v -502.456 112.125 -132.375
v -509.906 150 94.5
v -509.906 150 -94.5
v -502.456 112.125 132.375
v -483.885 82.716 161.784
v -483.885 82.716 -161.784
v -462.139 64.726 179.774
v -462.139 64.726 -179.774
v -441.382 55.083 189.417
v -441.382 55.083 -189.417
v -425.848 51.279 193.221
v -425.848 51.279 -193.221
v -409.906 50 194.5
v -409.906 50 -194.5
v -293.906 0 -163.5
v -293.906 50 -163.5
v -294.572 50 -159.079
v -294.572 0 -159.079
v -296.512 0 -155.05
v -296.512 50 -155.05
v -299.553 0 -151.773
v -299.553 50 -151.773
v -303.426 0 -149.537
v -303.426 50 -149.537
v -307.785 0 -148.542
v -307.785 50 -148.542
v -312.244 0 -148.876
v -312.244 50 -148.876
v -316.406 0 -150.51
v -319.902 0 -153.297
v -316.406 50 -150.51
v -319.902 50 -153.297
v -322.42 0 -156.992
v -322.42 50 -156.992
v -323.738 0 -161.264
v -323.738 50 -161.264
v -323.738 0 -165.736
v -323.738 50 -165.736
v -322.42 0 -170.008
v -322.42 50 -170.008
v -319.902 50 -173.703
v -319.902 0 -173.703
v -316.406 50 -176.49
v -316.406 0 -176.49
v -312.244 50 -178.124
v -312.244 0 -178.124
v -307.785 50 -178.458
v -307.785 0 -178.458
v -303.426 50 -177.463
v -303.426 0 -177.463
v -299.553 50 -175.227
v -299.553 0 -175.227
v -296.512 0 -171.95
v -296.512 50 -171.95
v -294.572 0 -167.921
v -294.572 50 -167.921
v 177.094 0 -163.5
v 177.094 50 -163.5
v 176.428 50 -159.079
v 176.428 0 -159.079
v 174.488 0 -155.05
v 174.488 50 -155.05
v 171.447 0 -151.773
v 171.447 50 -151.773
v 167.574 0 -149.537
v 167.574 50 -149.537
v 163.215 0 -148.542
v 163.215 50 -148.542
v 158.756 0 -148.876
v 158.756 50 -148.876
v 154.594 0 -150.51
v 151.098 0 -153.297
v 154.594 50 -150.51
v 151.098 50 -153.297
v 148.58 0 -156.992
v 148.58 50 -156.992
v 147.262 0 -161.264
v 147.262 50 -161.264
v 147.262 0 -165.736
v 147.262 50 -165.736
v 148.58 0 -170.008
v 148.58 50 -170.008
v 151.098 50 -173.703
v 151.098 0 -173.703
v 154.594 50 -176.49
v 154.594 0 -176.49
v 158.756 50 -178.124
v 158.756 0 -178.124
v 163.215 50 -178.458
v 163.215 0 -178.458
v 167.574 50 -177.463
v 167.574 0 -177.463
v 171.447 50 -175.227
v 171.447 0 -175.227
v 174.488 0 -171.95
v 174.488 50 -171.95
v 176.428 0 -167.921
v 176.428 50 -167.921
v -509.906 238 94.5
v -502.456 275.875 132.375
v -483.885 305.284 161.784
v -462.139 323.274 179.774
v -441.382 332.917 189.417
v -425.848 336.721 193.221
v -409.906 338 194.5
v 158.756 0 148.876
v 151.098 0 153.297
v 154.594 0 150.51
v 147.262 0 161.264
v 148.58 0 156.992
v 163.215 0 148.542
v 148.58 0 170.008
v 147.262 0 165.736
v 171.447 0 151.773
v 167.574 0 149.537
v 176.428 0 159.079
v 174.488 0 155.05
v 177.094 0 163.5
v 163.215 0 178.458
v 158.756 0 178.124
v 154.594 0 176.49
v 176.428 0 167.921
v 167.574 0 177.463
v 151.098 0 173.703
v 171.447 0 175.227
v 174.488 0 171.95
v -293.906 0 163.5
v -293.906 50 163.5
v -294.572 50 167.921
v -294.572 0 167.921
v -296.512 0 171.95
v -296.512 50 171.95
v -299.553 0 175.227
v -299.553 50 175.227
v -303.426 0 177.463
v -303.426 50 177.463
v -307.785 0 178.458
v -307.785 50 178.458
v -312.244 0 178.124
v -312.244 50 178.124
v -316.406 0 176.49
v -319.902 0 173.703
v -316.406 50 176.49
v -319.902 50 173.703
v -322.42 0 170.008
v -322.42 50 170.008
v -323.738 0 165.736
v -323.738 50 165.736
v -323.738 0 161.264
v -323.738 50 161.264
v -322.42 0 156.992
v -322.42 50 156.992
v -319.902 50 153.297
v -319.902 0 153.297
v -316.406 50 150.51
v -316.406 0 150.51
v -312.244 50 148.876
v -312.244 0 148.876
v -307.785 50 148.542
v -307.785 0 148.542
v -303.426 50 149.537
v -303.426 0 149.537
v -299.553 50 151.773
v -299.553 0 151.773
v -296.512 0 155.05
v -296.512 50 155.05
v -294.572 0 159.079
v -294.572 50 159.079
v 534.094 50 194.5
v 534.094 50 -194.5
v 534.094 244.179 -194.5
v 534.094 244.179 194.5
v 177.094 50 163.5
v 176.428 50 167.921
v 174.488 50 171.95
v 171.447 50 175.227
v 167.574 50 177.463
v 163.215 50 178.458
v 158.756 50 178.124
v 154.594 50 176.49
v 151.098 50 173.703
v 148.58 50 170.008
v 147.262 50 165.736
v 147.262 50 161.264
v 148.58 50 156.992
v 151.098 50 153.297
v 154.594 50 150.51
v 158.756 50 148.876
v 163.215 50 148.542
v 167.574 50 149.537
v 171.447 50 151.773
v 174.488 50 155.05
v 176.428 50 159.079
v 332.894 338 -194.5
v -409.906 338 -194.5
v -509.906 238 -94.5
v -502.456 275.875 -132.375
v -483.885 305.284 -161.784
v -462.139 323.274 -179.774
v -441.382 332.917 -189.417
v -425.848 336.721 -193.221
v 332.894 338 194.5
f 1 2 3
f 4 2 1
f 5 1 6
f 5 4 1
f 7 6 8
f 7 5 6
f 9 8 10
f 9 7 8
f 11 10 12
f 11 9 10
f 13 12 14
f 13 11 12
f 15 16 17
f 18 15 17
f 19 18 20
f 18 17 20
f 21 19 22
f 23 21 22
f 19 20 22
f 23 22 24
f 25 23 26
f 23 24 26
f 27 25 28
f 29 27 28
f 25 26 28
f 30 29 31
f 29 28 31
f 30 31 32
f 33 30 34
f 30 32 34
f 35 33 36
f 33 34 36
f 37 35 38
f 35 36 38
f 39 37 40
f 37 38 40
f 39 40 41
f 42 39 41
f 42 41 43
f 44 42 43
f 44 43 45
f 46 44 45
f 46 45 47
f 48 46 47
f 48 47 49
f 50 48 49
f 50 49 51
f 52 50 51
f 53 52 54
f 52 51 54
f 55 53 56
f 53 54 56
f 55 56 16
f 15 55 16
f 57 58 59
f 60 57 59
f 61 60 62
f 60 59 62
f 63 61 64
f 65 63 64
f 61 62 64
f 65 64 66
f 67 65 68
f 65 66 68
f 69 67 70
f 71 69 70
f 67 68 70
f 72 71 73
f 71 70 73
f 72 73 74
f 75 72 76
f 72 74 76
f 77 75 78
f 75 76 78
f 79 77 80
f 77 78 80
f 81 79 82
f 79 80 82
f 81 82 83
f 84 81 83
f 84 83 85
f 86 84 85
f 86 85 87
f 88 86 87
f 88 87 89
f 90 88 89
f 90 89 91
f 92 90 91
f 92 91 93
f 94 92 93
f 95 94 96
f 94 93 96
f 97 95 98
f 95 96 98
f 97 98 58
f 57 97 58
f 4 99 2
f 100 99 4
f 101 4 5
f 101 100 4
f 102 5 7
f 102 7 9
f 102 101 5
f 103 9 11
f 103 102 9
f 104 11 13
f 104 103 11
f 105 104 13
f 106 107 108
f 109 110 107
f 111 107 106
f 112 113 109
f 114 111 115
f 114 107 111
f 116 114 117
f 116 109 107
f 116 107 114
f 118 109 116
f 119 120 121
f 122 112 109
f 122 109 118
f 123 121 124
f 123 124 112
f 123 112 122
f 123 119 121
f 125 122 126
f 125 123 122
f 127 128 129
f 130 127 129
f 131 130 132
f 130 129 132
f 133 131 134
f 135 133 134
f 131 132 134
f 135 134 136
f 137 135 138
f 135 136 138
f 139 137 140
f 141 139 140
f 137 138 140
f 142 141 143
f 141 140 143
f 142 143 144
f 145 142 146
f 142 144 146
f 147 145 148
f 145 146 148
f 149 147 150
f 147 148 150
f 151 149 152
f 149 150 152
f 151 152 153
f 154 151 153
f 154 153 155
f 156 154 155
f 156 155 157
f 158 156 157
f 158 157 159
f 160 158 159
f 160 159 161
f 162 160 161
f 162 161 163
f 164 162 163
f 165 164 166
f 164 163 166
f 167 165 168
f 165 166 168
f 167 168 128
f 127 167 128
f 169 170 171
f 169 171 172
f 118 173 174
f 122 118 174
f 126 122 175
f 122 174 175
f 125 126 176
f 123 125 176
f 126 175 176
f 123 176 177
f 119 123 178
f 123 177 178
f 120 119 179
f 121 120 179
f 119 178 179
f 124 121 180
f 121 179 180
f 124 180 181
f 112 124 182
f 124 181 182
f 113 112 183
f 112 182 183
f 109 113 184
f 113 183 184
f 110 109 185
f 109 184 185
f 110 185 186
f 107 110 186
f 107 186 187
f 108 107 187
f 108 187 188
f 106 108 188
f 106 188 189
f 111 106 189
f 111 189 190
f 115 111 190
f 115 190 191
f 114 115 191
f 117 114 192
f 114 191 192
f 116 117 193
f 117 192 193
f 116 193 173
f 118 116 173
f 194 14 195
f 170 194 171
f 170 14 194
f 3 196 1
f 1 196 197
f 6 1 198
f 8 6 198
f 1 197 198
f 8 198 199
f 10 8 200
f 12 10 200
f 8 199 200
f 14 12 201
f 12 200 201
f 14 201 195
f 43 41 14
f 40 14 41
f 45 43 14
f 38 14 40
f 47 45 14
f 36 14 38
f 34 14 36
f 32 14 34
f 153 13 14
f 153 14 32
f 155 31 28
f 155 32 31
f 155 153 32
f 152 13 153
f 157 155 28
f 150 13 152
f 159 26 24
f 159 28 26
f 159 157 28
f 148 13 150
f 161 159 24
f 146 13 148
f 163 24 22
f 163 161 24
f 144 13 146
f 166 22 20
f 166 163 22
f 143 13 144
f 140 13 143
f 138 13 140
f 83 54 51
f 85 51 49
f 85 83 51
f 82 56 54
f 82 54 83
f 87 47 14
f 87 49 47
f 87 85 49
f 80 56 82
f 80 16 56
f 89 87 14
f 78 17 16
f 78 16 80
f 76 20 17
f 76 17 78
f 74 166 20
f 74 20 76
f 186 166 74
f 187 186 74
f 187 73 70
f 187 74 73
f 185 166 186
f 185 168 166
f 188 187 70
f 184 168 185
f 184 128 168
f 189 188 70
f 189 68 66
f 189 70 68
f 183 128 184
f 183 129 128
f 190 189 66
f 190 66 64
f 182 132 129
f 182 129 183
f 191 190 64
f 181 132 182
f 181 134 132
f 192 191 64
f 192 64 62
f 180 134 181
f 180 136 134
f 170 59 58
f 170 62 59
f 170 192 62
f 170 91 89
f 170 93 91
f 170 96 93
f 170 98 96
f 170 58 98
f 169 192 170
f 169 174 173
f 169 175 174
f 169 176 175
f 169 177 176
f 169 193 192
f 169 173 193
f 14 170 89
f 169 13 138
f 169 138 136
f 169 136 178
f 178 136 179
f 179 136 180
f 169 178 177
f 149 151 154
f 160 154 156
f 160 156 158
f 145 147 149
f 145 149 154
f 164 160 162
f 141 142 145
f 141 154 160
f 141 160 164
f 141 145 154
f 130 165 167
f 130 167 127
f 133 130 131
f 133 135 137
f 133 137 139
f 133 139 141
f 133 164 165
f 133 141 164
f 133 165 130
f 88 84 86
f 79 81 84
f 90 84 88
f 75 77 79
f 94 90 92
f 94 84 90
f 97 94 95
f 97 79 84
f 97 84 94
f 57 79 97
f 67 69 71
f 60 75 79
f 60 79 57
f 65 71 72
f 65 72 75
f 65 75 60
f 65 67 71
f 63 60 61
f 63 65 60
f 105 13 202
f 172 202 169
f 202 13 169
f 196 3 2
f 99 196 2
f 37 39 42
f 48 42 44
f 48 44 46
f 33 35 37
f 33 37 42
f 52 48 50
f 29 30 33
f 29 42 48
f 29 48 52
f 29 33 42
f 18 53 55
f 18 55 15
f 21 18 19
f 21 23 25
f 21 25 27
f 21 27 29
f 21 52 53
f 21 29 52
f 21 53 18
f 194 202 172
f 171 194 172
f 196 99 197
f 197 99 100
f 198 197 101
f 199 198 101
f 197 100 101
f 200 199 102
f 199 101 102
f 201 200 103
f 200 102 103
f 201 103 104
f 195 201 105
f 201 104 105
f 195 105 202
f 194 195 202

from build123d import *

# Parameters (mm, degrees)
F0_W     = 1044
F0_H     = 389
F1_DEPTH = 288
F2_R     = 100
F4_DEPTH = 389.001
F5_R     = 15
F6_DEPTH = 50


with BuildPart() as f1:
    # F0 (on Front) → F1 (new body)
    with BuildSketch(Plane.XZ):
        with Locations((12.094161, 0)):
            Rectangle(F0_W, F0_H)
    extrude(amount=-F1_DEPTH)

    # F2
    f2_edges = [f1.edges().sort_by_distance(p)[0] for p in [
        (-509.905839, 144, 194.5),
        (-509.905839, 288, 0),
        (-509.905839, 144, -194.5),
        (-509.905839, 0, 0),
    ]]
    fillet(f2_edges, radius=F2_R)

    # F3 (on face) → F4 (cut, through all)
    with BuildSketch(Plane.XY.offset(194.5)):
        Polygon((534.094161, 288), (332.893832, 288), (534.094161, 194.178746), align=None)
    extrude(amount=-F4_DEPTH, mode=Mode.SUBTRACT)

    # F5 (on face) → F6 (join)
    with BuildSketch(Plane.XZ):
        with Locations((162.094161, -163.5)):
            Circle(F5_R)
        with Locations((-308.905839, -163.5)):
            Circle(F5_R)
        with Locations((162.094161, 163.5)):
            Circle(F5_R)
        with Locations((-308.905839, 163.5)):
            Circle(F5_R)
    extrude(amount=F6_DEPTH)


with BuildPart() as f1_1:
    # F7: moved
    add(f1.part.moved(Location((0, 50, 0))))


solid = f1_1.part
